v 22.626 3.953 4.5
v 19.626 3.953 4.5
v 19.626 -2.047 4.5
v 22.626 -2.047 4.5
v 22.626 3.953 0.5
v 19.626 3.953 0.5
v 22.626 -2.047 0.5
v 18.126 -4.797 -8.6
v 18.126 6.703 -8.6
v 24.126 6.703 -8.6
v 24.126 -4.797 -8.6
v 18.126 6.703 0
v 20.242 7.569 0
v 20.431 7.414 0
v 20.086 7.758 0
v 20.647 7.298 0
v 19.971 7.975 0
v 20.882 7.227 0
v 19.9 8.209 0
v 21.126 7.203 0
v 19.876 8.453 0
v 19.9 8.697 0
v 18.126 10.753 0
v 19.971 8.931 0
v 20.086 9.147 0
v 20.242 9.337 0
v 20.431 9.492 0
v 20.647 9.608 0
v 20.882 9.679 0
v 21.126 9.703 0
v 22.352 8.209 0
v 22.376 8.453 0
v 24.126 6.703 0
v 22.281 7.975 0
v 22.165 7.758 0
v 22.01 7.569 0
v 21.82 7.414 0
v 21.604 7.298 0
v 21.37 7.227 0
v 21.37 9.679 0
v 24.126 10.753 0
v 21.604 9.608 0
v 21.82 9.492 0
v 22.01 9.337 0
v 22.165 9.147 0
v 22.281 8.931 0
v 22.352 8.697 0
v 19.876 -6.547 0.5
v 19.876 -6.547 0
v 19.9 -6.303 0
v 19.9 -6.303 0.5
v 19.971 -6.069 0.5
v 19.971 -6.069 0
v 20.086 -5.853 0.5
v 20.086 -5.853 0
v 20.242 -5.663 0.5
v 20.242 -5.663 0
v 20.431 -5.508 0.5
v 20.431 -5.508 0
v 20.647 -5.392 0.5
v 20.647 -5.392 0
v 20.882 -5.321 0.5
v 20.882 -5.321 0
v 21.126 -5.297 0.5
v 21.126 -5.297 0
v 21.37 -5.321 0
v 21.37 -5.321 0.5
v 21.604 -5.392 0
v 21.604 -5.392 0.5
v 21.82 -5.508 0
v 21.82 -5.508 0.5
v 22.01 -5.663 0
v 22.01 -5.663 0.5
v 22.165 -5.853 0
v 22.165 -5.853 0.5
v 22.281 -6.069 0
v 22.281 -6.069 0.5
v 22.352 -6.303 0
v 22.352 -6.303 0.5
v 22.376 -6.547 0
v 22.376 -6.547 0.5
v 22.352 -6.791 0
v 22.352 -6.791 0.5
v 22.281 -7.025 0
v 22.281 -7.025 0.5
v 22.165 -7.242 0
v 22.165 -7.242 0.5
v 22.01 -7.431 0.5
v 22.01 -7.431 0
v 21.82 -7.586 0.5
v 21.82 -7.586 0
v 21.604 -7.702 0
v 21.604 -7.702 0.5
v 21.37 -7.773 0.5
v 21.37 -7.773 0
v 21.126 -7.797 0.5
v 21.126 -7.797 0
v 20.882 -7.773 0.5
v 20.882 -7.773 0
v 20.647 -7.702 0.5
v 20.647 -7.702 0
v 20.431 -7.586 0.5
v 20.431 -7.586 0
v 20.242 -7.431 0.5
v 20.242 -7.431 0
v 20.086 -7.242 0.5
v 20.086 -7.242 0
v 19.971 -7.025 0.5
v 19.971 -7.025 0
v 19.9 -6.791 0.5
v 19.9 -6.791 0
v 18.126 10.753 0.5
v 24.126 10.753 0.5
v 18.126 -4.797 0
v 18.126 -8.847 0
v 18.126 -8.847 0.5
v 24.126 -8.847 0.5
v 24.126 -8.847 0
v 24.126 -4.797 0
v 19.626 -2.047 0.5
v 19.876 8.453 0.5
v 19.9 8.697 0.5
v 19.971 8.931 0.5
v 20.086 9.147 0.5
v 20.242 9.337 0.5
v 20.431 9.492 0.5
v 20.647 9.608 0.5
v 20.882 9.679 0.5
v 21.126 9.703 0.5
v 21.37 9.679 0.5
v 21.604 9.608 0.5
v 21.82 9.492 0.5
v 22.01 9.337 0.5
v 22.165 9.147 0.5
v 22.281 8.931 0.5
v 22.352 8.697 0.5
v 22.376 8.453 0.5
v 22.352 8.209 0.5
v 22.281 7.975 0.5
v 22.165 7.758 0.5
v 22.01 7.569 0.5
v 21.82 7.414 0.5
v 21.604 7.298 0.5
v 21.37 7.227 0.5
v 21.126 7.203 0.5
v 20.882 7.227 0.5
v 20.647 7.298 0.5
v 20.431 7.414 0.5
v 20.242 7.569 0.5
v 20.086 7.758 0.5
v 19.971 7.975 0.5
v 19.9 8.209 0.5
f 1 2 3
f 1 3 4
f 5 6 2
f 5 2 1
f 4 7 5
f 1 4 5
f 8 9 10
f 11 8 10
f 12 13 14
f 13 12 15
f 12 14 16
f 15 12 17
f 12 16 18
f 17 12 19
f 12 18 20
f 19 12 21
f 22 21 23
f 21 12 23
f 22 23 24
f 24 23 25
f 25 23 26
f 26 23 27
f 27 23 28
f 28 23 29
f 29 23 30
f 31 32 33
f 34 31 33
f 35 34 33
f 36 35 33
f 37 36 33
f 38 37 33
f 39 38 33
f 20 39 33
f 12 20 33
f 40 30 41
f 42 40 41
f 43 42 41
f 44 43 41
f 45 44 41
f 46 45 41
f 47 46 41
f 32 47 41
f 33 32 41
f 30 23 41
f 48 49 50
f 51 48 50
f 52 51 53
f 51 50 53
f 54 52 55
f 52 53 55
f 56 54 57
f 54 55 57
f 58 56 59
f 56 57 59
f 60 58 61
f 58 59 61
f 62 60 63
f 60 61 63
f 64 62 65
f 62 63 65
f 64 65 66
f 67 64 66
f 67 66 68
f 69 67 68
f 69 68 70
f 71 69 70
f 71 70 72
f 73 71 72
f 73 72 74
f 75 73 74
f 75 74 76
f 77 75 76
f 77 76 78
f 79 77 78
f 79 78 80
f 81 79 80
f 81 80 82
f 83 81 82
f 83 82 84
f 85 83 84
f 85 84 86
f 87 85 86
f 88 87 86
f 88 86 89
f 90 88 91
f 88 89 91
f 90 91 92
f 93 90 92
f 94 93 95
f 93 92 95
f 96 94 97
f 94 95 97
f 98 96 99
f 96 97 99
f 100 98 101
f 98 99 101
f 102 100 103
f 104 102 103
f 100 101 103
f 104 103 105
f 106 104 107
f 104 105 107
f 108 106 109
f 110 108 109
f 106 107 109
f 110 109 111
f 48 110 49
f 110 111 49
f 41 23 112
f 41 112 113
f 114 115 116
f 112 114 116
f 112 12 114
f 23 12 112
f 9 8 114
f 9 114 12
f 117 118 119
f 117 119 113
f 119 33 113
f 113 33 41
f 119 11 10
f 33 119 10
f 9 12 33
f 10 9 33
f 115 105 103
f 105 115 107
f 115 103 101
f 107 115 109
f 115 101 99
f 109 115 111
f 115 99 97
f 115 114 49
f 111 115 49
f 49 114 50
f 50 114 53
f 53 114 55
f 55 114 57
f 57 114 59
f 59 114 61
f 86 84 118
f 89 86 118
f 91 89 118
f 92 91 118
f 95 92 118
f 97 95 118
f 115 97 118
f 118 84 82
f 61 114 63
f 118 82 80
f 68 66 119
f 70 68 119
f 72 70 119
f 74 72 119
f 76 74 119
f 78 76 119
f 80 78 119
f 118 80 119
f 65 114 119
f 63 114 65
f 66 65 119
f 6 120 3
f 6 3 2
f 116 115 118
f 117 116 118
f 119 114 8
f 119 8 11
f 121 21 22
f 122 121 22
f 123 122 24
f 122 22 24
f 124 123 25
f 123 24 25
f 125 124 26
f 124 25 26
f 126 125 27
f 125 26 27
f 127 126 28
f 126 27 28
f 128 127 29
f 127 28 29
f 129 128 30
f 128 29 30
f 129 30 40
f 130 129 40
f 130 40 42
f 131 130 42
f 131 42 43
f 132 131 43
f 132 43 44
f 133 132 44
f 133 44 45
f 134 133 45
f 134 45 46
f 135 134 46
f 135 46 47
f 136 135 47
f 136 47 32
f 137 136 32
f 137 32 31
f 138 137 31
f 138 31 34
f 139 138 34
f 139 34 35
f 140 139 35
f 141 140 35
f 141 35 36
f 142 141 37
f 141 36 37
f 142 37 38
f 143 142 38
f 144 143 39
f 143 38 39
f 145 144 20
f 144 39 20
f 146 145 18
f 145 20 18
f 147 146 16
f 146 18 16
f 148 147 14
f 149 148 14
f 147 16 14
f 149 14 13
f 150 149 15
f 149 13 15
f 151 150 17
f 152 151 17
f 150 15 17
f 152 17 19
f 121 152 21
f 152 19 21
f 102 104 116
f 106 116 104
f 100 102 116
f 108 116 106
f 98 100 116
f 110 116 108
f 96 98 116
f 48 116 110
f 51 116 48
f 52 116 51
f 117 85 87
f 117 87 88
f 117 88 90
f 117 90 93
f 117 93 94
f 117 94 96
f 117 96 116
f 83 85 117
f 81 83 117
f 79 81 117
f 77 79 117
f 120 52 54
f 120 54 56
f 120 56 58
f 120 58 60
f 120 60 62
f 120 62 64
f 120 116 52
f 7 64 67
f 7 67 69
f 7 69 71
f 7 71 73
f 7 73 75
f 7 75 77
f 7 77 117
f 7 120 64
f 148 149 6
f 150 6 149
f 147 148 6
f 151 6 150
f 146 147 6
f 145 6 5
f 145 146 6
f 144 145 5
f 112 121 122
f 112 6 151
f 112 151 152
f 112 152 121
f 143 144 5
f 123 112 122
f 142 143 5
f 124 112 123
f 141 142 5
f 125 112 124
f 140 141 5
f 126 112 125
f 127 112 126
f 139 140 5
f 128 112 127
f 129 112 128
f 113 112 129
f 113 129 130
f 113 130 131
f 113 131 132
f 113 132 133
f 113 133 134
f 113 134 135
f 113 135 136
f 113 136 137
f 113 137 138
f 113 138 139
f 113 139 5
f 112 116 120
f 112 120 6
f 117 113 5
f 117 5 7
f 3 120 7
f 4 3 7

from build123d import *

# Parameters (mm, degrees)
SKETCH1_W           = 6
SKETCH1_H           = 19.6
BOSS_EXTRUDE1_DEPTH = 0.5
SKETCH2_R           = 1.25
CUT_EXTRUDE1_DEPTH  = 1
SKETCH3_W           = 6
SKETCH3_H           = 11.5
BOSS_EXTRUDE2_DEPTH = 9.1
SKETCH6_W           = 3
SKETCH6_H           = 6
BOSS_EXTRUDE3_DEPTH = 4


with BuildPart() as part:
    # Sketch1 → Boss-Extrude1 (new body)
    with BuildSketch(Plane.XY):
        with Locations((21.125833333, 0.952916667)):
            Rectangle(SKETCH1_W, SKETCH1_H)
    extrude(amount=BOSS_EXTRUDE1_DEPTH)

    # Sketch2 → Cut-Extrude1 (cut)
    with BuildSketch(Plane(origin=(0, 0, 0), x_dir=(-1, 0, 0), z_dir=(0, 0, -1))):
        with Locations((-21.125833333, 8.452916667)):
            Circle(SKETCH2_R)
        with Locations((-21.125833333, -6.547083333)):
            Circle(SKETCH2_R)
    extrude(amount=-CUT_EXTRUDE1_DEPTH, mode=Mode.SUBTRACT)



with BuildPart() as body_2:
    # Sketch3 → Boss-Extrude2 (new body)
    with BuildSketch(Plane.XY.offset(0.5)):
        with Locations((21.125833333, 0.952916667)):
            Rectangle(SKETCH3_W, SKETCH3_H)
    extrude(amount=-BOSS_EXTRUDE2_DEPTH)


with BuildPart() as part_1:
    add(part.part)

    add(body_2.part)  # Boss-Extrude3 merges body 2
    # Sketch6 → Boss-Extrude3 (add)
    with BuildSketch(Plane.XY.offset(0.5)):
        with Locations((21.125833333, 0.952916667)):
            Rectangle(SKETCH6_W, SKETCH6_H)
    extrude(amount=BOSS_EXTRUDE3_DEPTH)


solid = part_1.part
